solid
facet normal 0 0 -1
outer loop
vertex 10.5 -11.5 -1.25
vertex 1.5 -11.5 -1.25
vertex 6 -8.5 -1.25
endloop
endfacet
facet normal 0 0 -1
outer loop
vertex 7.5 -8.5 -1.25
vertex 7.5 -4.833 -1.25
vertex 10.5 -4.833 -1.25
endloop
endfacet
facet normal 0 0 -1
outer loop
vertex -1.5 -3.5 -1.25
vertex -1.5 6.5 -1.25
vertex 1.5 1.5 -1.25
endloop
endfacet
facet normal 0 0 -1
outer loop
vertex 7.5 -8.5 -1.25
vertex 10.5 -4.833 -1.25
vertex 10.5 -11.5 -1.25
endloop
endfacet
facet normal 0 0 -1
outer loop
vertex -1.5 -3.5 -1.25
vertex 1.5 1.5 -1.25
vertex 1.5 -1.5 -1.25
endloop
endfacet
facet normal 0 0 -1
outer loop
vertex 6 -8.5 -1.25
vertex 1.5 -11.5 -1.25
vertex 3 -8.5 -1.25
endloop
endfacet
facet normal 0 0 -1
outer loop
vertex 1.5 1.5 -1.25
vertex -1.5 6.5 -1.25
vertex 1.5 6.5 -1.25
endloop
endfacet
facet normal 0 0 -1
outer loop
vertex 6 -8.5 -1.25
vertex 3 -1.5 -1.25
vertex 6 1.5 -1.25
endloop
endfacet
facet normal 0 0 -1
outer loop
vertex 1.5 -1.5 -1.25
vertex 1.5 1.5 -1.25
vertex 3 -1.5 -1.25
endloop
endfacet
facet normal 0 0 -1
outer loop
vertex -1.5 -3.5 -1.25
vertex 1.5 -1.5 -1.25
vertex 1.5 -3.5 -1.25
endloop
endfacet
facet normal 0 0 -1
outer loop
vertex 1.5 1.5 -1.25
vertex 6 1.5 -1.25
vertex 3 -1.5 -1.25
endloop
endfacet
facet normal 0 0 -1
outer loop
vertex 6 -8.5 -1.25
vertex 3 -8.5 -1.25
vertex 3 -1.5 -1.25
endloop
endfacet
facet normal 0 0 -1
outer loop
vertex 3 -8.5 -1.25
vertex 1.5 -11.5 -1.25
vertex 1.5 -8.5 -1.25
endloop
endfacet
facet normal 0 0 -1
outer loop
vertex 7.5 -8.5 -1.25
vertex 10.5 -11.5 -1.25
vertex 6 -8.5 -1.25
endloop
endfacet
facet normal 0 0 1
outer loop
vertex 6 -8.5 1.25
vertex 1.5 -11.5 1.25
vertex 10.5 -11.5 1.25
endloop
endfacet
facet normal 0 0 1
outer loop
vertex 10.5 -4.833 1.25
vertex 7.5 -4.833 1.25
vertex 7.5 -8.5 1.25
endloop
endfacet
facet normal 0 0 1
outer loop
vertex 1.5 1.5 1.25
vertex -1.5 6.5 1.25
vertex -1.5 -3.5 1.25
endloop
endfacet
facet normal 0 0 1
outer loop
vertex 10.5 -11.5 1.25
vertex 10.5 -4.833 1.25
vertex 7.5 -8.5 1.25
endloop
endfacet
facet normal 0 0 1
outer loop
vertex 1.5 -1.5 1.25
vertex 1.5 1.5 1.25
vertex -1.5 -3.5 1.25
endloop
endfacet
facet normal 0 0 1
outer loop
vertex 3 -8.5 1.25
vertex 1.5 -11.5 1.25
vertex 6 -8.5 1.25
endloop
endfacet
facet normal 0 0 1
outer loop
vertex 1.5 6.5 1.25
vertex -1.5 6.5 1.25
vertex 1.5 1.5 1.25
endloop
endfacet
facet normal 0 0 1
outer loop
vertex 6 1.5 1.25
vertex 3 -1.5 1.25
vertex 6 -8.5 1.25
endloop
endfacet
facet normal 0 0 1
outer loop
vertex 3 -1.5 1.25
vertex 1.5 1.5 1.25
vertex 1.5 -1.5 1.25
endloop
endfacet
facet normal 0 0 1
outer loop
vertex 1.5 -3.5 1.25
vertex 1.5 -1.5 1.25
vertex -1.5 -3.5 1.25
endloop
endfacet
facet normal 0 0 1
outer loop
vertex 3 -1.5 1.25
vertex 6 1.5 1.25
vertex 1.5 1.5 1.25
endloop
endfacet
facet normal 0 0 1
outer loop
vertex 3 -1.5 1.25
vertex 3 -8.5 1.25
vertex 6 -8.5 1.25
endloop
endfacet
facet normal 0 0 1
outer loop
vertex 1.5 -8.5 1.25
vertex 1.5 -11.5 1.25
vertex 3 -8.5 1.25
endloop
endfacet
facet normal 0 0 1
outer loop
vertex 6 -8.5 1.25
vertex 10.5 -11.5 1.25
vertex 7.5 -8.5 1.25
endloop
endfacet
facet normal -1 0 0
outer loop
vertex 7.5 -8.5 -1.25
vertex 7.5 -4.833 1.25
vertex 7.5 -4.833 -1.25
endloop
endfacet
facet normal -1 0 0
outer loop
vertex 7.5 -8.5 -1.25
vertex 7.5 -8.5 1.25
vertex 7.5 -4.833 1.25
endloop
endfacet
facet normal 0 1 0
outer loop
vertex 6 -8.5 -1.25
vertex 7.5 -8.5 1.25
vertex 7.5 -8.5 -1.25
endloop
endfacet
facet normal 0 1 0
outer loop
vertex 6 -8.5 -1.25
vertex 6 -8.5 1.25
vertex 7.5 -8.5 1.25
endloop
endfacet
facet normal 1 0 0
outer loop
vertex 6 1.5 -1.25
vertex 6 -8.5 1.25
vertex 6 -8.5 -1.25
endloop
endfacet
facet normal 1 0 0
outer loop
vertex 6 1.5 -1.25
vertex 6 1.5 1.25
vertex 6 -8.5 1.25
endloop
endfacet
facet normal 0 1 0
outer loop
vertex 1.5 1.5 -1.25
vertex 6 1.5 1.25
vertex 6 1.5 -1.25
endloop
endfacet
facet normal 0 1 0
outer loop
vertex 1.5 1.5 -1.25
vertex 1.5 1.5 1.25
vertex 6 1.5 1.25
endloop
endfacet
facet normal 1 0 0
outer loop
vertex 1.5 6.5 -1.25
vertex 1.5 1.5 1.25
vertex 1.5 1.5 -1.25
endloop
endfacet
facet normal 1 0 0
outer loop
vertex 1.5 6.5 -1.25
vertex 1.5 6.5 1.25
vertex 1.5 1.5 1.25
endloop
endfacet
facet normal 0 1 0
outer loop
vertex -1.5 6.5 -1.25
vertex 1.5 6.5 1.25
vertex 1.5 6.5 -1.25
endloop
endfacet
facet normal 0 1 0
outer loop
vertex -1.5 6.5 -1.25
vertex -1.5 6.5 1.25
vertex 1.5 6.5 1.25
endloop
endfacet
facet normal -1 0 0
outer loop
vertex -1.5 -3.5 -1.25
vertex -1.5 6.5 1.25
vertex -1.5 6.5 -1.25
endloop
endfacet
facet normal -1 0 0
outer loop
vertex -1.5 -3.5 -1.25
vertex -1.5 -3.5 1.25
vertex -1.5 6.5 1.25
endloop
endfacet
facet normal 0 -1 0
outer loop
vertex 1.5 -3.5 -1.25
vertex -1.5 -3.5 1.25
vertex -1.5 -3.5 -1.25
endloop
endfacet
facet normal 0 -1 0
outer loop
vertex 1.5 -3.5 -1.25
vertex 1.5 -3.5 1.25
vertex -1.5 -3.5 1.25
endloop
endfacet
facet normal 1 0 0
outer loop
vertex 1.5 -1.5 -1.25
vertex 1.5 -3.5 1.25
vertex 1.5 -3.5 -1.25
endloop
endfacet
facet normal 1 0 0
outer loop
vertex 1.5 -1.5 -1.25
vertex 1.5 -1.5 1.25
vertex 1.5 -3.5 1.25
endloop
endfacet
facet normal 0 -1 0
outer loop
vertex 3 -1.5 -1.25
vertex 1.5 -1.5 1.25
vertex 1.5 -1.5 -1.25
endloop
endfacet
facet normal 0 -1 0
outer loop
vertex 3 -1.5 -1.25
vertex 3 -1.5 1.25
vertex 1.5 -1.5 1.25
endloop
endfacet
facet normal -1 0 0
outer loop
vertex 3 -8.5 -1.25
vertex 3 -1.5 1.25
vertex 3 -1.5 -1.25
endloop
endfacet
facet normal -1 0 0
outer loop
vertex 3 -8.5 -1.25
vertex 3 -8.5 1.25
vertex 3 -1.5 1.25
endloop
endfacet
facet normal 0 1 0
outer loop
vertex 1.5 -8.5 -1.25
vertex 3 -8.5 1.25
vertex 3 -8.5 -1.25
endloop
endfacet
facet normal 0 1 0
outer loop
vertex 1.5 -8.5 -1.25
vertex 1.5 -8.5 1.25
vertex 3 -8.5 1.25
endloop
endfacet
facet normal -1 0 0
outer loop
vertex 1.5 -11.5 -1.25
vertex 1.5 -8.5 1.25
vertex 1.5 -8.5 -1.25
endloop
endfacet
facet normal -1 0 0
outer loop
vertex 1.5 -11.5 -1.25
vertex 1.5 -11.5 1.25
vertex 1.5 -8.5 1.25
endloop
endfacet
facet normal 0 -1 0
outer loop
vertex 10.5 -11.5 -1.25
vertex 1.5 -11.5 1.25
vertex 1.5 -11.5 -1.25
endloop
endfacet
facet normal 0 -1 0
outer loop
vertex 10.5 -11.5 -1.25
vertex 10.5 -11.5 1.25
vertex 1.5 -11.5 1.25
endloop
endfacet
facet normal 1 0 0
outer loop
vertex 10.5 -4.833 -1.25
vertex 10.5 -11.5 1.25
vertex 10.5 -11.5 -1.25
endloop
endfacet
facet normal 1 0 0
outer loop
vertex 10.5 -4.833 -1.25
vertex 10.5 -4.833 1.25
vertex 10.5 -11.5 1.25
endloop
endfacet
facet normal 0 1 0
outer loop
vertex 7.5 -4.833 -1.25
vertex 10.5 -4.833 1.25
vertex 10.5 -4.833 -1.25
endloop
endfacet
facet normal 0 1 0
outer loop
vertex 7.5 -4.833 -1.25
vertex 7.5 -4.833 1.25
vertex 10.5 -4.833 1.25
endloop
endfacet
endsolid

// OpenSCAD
thickness = 2.5; //mm
depth = 3; //mm
inside_height = 10; //mm
hook_length = inside_height / 1.5;

linear_extrude(thickness, center=true) {
  translate([0, depth/2]) {
    square([depth, inside_height], center=true);
  }
  translate([depth,0]) {
    square([depth, depth], center=true);
  }
  translate([depth*1.5, (inside_height)/-2]) {
    square([depth, inside_height+depth], center=true);
  }
  translate([depth*2,(inside_height)/-1]) {
    square([depth*3, depth], center=true);
  }
  translate([depth * 3, -1 * (inside_height-(hook_length-depth)/2)]) {
    square([depth, hook_length], center=true);
  }
}
